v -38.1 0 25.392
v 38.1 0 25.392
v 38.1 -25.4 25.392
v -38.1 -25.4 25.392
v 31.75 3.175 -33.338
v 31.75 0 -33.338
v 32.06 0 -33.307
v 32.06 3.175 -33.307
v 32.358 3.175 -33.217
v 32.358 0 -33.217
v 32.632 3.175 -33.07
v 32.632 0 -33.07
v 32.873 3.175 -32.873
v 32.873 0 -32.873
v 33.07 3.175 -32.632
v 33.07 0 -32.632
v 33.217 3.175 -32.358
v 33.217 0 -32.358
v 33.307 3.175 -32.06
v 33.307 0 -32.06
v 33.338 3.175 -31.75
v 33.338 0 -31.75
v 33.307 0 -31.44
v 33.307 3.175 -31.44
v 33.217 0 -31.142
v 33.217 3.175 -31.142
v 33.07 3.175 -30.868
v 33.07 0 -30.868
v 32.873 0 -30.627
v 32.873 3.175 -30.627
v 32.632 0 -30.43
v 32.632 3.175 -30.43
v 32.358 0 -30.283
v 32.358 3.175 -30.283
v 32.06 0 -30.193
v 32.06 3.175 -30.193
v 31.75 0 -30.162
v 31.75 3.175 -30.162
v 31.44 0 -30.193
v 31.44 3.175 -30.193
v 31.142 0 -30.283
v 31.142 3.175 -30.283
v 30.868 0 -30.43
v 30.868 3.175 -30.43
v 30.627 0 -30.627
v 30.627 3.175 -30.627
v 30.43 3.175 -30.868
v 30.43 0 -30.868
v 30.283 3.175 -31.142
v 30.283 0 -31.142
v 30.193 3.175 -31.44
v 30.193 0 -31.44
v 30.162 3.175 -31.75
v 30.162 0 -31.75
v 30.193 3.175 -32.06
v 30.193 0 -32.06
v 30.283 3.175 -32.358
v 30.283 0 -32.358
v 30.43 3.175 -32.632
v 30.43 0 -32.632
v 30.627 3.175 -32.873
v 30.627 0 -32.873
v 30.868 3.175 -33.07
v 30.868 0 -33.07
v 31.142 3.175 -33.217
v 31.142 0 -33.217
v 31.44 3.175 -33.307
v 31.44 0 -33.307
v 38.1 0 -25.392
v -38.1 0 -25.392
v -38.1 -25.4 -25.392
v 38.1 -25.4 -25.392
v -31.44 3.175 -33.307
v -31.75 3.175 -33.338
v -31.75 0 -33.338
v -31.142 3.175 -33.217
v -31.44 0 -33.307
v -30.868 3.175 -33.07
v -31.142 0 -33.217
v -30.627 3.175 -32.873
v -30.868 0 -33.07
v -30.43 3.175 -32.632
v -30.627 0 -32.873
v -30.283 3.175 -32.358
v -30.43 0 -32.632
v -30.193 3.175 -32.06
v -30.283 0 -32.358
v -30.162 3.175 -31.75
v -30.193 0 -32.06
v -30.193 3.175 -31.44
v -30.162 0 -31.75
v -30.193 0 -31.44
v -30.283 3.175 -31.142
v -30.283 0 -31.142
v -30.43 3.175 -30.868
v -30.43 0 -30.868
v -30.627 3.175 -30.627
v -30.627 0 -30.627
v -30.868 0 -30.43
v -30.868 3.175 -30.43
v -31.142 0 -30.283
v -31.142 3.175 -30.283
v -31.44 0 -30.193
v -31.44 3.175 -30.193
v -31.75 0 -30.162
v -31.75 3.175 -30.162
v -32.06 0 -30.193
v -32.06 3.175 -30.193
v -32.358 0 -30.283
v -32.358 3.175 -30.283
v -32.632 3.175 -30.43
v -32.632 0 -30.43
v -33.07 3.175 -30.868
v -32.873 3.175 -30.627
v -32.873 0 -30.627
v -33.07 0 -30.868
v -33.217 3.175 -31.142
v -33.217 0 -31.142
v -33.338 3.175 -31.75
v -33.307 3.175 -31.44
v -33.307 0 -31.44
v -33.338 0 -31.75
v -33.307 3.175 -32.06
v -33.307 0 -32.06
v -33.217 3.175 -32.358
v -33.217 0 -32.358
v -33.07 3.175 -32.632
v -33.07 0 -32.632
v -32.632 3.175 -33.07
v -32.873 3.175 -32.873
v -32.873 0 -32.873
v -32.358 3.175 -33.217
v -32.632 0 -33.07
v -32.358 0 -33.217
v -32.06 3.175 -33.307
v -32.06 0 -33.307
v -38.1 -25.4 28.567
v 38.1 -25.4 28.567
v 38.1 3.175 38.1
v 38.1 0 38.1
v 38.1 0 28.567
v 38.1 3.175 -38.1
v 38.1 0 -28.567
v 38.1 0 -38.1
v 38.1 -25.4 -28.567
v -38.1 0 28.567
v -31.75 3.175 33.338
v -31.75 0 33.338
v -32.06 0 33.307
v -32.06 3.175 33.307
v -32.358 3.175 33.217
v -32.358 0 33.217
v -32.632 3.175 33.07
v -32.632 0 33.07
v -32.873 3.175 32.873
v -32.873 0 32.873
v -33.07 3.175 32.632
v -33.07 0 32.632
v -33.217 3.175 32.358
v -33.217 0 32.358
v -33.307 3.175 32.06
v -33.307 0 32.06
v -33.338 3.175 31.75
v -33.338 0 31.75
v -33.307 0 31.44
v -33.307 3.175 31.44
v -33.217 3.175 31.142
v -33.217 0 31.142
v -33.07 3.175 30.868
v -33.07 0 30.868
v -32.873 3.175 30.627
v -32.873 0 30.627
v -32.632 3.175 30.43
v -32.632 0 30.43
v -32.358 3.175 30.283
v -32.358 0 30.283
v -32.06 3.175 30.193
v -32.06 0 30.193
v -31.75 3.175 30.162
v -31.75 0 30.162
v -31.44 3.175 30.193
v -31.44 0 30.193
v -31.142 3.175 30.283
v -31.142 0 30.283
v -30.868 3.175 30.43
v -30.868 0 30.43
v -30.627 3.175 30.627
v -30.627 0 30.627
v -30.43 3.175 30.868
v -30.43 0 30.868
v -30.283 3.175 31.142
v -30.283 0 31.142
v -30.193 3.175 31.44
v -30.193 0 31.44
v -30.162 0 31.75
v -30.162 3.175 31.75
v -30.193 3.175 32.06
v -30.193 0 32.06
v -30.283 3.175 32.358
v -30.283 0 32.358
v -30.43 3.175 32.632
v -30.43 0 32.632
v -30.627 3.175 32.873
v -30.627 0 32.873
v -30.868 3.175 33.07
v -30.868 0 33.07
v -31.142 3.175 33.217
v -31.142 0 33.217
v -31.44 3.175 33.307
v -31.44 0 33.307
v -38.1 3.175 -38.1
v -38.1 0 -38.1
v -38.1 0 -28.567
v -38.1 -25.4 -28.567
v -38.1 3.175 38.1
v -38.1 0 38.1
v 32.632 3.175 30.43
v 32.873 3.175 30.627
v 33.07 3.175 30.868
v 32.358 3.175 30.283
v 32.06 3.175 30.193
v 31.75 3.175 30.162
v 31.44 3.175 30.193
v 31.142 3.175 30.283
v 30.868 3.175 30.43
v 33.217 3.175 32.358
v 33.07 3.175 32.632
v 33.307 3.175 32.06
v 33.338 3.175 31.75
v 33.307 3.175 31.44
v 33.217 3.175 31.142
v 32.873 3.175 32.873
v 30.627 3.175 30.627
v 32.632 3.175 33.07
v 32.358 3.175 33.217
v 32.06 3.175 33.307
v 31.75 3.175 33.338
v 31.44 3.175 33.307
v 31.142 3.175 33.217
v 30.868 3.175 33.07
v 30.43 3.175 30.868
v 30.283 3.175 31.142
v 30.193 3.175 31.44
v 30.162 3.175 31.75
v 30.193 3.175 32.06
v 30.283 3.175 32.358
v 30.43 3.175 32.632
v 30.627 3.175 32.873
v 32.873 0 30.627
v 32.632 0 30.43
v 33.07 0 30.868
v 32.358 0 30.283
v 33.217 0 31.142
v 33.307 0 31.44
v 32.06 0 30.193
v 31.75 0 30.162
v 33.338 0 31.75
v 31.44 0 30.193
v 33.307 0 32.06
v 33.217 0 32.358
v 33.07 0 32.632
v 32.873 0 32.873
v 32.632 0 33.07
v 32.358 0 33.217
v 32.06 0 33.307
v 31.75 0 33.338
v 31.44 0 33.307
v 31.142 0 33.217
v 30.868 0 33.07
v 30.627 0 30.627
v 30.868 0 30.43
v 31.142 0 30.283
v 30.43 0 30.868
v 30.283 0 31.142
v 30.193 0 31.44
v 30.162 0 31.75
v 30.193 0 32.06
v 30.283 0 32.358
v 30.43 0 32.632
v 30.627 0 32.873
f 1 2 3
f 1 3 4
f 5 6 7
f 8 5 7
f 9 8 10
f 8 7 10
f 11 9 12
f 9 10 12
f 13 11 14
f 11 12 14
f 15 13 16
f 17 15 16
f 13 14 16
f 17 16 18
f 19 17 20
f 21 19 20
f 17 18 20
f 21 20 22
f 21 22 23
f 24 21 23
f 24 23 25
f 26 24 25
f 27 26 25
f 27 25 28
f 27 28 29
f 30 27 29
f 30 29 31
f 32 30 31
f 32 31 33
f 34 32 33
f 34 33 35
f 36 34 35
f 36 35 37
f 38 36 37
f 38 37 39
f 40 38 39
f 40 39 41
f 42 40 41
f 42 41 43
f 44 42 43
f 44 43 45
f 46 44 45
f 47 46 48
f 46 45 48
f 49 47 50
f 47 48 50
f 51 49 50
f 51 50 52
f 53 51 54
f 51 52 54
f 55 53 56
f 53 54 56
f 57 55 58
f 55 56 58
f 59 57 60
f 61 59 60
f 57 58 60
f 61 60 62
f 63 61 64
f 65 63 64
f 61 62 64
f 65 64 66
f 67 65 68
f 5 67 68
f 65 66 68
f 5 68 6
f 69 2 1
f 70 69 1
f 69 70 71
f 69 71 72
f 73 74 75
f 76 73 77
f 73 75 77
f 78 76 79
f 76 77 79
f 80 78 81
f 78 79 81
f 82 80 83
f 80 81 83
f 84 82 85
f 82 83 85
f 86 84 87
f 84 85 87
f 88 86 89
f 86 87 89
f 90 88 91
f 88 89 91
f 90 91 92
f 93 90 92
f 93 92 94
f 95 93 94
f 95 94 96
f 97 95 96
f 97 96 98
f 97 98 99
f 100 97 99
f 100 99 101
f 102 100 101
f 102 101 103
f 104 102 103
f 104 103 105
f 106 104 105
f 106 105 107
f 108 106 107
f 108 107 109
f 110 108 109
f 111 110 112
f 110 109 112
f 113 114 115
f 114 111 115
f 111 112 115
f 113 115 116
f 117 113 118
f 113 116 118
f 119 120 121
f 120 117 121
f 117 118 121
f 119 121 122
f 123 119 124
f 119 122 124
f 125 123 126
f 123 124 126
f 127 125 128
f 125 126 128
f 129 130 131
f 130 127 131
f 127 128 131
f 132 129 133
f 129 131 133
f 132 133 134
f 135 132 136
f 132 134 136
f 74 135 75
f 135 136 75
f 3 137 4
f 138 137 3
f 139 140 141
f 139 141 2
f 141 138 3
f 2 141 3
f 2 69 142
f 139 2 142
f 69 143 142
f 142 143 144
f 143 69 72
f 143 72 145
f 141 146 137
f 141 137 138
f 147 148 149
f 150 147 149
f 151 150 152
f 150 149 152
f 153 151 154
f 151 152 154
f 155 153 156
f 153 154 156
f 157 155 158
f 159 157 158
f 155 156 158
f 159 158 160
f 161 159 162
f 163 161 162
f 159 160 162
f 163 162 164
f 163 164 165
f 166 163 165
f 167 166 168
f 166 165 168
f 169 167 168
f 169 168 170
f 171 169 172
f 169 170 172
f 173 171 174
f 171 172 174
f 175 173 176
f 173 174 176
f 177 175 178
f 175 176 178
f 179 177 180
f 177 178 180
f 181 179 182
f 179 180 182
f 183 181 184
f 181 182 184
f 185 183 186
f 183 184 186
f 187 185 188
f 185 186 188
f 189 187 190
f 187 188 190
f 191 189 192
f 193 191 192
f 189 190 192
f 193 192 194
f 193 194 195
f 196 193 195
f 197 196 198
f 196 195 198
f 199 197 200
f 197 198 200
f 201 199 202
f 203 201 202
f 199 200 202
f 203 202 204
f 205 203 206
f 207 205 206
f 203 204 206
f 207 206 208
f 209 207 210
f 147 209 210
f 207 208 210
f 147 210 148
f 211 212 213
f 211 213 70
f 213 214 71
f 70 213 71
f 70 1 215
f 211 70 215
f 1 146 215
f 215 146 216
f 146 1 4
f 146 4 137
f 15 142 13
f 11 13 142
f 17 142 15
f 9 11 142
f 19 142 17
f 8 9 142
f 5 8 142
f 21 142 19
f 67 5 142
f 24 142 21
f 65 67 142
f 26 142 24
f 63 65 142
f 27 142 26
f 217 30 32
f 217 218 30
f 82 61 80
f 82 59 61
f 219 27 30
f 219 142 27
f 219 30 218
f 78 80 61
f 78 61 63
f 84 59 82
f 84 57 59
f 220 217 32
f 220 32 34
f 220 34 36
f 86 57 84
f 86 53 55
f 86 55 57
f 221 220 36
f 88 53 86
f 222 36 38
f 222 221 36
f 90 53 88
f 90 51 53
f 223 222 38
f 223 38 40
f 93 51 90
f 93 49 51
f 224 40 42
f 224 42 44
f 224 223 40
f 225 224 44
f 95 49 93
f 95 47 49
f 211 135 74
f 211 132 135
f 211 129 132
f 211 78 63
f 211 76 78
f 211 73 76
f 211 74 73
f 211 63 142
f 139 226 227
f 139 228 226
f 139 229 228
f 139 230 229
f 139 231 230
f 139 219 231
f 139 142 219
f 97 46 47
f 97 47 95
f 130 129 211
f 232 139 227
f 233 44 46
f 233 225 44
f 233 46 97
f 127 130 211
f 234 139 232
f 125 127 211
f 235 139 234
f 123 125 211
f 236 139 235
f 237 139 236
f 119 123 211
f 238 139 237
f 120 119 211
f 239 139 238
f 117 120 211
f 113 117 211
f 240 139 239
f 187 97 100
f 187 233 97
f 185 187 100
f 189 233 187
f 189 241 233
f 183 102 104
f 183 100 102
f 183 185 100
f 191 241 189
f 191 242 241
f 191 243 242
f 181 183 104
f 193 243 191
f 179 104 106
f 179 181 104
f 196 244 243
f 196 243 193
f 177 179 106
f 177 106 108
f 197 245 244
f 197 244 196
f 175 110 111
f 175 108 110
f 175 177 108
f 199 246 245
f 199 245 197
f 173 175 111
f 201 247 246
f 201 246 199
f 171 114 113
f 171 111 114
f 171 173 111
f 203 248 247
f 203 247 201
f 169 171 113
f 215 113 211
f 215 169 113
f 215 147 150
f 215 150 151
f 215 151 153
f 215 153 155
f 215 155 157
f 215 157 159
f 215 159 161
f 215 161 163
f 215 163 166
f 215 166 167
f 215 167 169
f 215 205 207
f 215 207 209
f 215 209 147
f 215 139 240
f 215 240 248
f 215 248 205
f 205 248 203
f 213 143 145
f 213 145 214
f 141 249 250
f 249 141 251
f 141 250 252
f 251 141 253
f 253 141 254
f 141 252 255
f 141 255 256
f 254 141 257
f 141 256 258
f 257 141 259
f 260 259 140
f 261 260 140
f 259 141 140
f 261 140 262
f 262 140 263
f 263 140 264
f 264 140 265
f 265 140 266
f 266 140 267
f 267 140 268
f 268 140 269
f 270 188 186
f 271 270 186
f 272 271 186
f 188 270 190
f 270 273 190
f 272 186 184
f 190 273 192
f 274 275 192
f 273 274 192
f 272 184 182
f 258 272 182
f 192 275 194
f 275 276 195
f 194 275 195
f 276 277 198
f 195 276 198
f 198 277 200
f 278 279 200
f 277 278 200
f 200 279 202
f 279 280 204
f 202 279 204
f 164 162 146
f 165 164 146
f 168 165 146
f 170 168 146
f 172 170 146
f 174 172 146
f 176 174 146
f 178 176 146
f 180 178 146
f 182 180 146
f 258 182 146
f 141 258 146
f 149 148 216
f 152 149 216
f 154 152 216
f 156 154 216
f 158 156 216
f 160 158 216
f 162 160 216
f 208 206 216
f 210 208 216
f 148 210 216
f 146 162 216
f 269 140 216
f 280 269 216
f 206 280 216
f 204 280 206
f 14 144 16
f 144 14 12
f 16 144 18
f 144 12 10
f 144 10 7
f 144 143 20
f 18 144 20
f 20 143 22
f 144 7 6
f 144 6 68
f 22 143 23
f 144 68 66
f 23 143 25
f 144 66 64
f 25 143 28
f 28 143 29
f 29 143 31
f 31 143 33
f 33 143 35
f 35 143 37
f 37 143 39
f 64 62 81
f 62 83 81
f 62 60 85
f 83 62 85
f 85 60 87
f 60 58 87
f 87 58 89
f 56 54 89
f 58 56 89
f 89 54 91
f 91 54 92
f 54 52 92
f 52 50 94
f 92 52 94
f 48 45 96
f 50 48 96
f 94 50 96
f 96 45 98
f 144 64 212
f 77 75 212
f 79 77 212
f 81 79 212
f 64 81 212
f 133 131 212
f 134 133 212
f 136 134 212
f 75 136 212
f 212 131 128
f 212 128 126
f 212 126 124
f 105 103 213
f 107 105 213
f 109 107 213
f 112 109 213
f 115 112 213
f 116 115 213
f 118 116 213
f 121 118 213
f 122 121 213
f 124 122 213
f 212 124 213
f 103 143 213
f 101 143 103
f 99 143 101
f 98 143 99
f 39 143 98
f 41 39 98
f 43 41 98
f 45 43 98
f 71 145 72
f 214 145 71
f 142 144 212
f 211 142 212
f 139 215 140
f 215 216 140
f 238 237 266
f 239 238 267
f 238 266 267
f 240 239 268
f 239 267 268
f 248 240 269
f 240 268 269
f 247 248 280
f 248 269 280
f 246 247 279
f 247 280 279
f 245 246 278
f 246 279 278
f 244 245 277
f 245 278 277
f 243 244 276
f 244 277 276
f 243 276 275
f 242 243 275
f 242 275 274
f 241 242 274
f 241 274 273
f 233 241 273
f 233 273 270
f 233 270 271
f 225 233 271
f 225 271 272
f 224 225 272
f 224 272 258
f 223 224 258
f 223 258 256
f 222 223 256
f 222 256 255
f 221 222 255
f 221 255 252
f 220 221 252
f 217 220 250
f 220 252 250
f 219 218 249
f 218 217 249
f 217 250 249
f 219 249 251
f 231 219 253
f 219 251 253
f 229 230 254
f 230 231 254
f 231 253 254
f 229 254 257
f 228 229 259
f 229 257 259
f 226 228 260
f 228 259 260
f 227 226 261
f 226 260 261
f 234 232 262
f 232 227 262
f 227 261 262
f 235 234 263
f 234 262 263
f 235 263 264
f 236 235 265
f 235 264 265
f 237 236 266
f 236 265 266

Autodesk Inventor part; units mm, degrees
ref_plane "YZ Plane" through (0, 0, 0) normal (1, 0, 0) x (0, 1, 0)
ref_plane "XZ Plane" through (0, 0, 0) normal (0, 1, 0) x (-1, 0, 0)
sketch "Sketch1" plane through (0, 0, 0) normal (0, 1, 0) x (-1, 0, 0)
  line L0 (0, 0) -> (4.388, 0) construction
  line L1 (4.1982, 0) -> (0, 0) construction
  line L2 (0, 0) -> (0, -4.5146) construction
  line L3 (38.1, 38.1) -> (-38.1, 38.1)
  line L4 (-38.1, 38.1) -> (-38.1, -38.1)
  line L5 (-38.1, -38.1) -> (38.1, -38.1)
  line L6 (38.1, -38.1) -> (38.1, 38.1)
  dimension "d0" = 76.2
  dimension "d1" = 76.2
extrude "Extrusion1" add sketch "Sketch1" along normal blind 3.175
ref_plane "Work Plane1" through (0, 0, 25.4) normal (0, 0, 1) x (1, 0, 0)
sketch "Sketch2" plane through (0, 0, 0) normal (0, -1, 0) x (1, 0, 0)
  line L0 (38.1, 38.1) -> (38.1, -38.1) projected
  line L1 (-38.1, -38.1) -> (-38.1, 38.1) projected
  line L2 (38.1, 25.3924) -> (-38.1, 25.3924)
  line L3 (-38.1, 25.3924) -> (-38.1, 28.5674)
  line L4 (-38.1, 28.5674) -> (38.1, 28.5674)
  line L5 (38.1, 28.5674) -> (38.1, 25.3924)
  point P0 (0, 0)
  dimension "d5" = 3.175
extrude "Extrusion2" add sketch "Sketch2" along normal blind 25.4
mirror "Mirror1" about plane through (0, 0, 0) normal (0, 0, 1) of "Extrusion2"
sketch "Sketch3" plane through (0, 3.175, 0) normal (0, 1, 0) x (1, 0, 0)
  line L0 (-38.1, 38.1) -> (-38.1, -38.1) projected
  line L1 (-38.1, -38.1) -> (38.1, -38.1) projected
  point P0 (0, 0)
  point P1 (-31.75, -31.75)
  dimension "d8" = 6.35
  dimension "d9" = 6.35
hole "Hole1" at (-31.75, 3.175, 31.75) direction (0, -1, 0) diameter 3.175 end through all
mirror "Mirror2" about plane through (0, 0, 0) normal (1, 0, 0) of "Hole1"
mirror "Mirror3" about plane through (0, 0, 0) normal (0, 0, 1) of "Hole1", "Mirror2"
ref_plane "Work Plane2" through (0, 0, 0) normal (0, 0, 1) x (1, 0, 0)
properties part number "Right Angle Frame Mount"
